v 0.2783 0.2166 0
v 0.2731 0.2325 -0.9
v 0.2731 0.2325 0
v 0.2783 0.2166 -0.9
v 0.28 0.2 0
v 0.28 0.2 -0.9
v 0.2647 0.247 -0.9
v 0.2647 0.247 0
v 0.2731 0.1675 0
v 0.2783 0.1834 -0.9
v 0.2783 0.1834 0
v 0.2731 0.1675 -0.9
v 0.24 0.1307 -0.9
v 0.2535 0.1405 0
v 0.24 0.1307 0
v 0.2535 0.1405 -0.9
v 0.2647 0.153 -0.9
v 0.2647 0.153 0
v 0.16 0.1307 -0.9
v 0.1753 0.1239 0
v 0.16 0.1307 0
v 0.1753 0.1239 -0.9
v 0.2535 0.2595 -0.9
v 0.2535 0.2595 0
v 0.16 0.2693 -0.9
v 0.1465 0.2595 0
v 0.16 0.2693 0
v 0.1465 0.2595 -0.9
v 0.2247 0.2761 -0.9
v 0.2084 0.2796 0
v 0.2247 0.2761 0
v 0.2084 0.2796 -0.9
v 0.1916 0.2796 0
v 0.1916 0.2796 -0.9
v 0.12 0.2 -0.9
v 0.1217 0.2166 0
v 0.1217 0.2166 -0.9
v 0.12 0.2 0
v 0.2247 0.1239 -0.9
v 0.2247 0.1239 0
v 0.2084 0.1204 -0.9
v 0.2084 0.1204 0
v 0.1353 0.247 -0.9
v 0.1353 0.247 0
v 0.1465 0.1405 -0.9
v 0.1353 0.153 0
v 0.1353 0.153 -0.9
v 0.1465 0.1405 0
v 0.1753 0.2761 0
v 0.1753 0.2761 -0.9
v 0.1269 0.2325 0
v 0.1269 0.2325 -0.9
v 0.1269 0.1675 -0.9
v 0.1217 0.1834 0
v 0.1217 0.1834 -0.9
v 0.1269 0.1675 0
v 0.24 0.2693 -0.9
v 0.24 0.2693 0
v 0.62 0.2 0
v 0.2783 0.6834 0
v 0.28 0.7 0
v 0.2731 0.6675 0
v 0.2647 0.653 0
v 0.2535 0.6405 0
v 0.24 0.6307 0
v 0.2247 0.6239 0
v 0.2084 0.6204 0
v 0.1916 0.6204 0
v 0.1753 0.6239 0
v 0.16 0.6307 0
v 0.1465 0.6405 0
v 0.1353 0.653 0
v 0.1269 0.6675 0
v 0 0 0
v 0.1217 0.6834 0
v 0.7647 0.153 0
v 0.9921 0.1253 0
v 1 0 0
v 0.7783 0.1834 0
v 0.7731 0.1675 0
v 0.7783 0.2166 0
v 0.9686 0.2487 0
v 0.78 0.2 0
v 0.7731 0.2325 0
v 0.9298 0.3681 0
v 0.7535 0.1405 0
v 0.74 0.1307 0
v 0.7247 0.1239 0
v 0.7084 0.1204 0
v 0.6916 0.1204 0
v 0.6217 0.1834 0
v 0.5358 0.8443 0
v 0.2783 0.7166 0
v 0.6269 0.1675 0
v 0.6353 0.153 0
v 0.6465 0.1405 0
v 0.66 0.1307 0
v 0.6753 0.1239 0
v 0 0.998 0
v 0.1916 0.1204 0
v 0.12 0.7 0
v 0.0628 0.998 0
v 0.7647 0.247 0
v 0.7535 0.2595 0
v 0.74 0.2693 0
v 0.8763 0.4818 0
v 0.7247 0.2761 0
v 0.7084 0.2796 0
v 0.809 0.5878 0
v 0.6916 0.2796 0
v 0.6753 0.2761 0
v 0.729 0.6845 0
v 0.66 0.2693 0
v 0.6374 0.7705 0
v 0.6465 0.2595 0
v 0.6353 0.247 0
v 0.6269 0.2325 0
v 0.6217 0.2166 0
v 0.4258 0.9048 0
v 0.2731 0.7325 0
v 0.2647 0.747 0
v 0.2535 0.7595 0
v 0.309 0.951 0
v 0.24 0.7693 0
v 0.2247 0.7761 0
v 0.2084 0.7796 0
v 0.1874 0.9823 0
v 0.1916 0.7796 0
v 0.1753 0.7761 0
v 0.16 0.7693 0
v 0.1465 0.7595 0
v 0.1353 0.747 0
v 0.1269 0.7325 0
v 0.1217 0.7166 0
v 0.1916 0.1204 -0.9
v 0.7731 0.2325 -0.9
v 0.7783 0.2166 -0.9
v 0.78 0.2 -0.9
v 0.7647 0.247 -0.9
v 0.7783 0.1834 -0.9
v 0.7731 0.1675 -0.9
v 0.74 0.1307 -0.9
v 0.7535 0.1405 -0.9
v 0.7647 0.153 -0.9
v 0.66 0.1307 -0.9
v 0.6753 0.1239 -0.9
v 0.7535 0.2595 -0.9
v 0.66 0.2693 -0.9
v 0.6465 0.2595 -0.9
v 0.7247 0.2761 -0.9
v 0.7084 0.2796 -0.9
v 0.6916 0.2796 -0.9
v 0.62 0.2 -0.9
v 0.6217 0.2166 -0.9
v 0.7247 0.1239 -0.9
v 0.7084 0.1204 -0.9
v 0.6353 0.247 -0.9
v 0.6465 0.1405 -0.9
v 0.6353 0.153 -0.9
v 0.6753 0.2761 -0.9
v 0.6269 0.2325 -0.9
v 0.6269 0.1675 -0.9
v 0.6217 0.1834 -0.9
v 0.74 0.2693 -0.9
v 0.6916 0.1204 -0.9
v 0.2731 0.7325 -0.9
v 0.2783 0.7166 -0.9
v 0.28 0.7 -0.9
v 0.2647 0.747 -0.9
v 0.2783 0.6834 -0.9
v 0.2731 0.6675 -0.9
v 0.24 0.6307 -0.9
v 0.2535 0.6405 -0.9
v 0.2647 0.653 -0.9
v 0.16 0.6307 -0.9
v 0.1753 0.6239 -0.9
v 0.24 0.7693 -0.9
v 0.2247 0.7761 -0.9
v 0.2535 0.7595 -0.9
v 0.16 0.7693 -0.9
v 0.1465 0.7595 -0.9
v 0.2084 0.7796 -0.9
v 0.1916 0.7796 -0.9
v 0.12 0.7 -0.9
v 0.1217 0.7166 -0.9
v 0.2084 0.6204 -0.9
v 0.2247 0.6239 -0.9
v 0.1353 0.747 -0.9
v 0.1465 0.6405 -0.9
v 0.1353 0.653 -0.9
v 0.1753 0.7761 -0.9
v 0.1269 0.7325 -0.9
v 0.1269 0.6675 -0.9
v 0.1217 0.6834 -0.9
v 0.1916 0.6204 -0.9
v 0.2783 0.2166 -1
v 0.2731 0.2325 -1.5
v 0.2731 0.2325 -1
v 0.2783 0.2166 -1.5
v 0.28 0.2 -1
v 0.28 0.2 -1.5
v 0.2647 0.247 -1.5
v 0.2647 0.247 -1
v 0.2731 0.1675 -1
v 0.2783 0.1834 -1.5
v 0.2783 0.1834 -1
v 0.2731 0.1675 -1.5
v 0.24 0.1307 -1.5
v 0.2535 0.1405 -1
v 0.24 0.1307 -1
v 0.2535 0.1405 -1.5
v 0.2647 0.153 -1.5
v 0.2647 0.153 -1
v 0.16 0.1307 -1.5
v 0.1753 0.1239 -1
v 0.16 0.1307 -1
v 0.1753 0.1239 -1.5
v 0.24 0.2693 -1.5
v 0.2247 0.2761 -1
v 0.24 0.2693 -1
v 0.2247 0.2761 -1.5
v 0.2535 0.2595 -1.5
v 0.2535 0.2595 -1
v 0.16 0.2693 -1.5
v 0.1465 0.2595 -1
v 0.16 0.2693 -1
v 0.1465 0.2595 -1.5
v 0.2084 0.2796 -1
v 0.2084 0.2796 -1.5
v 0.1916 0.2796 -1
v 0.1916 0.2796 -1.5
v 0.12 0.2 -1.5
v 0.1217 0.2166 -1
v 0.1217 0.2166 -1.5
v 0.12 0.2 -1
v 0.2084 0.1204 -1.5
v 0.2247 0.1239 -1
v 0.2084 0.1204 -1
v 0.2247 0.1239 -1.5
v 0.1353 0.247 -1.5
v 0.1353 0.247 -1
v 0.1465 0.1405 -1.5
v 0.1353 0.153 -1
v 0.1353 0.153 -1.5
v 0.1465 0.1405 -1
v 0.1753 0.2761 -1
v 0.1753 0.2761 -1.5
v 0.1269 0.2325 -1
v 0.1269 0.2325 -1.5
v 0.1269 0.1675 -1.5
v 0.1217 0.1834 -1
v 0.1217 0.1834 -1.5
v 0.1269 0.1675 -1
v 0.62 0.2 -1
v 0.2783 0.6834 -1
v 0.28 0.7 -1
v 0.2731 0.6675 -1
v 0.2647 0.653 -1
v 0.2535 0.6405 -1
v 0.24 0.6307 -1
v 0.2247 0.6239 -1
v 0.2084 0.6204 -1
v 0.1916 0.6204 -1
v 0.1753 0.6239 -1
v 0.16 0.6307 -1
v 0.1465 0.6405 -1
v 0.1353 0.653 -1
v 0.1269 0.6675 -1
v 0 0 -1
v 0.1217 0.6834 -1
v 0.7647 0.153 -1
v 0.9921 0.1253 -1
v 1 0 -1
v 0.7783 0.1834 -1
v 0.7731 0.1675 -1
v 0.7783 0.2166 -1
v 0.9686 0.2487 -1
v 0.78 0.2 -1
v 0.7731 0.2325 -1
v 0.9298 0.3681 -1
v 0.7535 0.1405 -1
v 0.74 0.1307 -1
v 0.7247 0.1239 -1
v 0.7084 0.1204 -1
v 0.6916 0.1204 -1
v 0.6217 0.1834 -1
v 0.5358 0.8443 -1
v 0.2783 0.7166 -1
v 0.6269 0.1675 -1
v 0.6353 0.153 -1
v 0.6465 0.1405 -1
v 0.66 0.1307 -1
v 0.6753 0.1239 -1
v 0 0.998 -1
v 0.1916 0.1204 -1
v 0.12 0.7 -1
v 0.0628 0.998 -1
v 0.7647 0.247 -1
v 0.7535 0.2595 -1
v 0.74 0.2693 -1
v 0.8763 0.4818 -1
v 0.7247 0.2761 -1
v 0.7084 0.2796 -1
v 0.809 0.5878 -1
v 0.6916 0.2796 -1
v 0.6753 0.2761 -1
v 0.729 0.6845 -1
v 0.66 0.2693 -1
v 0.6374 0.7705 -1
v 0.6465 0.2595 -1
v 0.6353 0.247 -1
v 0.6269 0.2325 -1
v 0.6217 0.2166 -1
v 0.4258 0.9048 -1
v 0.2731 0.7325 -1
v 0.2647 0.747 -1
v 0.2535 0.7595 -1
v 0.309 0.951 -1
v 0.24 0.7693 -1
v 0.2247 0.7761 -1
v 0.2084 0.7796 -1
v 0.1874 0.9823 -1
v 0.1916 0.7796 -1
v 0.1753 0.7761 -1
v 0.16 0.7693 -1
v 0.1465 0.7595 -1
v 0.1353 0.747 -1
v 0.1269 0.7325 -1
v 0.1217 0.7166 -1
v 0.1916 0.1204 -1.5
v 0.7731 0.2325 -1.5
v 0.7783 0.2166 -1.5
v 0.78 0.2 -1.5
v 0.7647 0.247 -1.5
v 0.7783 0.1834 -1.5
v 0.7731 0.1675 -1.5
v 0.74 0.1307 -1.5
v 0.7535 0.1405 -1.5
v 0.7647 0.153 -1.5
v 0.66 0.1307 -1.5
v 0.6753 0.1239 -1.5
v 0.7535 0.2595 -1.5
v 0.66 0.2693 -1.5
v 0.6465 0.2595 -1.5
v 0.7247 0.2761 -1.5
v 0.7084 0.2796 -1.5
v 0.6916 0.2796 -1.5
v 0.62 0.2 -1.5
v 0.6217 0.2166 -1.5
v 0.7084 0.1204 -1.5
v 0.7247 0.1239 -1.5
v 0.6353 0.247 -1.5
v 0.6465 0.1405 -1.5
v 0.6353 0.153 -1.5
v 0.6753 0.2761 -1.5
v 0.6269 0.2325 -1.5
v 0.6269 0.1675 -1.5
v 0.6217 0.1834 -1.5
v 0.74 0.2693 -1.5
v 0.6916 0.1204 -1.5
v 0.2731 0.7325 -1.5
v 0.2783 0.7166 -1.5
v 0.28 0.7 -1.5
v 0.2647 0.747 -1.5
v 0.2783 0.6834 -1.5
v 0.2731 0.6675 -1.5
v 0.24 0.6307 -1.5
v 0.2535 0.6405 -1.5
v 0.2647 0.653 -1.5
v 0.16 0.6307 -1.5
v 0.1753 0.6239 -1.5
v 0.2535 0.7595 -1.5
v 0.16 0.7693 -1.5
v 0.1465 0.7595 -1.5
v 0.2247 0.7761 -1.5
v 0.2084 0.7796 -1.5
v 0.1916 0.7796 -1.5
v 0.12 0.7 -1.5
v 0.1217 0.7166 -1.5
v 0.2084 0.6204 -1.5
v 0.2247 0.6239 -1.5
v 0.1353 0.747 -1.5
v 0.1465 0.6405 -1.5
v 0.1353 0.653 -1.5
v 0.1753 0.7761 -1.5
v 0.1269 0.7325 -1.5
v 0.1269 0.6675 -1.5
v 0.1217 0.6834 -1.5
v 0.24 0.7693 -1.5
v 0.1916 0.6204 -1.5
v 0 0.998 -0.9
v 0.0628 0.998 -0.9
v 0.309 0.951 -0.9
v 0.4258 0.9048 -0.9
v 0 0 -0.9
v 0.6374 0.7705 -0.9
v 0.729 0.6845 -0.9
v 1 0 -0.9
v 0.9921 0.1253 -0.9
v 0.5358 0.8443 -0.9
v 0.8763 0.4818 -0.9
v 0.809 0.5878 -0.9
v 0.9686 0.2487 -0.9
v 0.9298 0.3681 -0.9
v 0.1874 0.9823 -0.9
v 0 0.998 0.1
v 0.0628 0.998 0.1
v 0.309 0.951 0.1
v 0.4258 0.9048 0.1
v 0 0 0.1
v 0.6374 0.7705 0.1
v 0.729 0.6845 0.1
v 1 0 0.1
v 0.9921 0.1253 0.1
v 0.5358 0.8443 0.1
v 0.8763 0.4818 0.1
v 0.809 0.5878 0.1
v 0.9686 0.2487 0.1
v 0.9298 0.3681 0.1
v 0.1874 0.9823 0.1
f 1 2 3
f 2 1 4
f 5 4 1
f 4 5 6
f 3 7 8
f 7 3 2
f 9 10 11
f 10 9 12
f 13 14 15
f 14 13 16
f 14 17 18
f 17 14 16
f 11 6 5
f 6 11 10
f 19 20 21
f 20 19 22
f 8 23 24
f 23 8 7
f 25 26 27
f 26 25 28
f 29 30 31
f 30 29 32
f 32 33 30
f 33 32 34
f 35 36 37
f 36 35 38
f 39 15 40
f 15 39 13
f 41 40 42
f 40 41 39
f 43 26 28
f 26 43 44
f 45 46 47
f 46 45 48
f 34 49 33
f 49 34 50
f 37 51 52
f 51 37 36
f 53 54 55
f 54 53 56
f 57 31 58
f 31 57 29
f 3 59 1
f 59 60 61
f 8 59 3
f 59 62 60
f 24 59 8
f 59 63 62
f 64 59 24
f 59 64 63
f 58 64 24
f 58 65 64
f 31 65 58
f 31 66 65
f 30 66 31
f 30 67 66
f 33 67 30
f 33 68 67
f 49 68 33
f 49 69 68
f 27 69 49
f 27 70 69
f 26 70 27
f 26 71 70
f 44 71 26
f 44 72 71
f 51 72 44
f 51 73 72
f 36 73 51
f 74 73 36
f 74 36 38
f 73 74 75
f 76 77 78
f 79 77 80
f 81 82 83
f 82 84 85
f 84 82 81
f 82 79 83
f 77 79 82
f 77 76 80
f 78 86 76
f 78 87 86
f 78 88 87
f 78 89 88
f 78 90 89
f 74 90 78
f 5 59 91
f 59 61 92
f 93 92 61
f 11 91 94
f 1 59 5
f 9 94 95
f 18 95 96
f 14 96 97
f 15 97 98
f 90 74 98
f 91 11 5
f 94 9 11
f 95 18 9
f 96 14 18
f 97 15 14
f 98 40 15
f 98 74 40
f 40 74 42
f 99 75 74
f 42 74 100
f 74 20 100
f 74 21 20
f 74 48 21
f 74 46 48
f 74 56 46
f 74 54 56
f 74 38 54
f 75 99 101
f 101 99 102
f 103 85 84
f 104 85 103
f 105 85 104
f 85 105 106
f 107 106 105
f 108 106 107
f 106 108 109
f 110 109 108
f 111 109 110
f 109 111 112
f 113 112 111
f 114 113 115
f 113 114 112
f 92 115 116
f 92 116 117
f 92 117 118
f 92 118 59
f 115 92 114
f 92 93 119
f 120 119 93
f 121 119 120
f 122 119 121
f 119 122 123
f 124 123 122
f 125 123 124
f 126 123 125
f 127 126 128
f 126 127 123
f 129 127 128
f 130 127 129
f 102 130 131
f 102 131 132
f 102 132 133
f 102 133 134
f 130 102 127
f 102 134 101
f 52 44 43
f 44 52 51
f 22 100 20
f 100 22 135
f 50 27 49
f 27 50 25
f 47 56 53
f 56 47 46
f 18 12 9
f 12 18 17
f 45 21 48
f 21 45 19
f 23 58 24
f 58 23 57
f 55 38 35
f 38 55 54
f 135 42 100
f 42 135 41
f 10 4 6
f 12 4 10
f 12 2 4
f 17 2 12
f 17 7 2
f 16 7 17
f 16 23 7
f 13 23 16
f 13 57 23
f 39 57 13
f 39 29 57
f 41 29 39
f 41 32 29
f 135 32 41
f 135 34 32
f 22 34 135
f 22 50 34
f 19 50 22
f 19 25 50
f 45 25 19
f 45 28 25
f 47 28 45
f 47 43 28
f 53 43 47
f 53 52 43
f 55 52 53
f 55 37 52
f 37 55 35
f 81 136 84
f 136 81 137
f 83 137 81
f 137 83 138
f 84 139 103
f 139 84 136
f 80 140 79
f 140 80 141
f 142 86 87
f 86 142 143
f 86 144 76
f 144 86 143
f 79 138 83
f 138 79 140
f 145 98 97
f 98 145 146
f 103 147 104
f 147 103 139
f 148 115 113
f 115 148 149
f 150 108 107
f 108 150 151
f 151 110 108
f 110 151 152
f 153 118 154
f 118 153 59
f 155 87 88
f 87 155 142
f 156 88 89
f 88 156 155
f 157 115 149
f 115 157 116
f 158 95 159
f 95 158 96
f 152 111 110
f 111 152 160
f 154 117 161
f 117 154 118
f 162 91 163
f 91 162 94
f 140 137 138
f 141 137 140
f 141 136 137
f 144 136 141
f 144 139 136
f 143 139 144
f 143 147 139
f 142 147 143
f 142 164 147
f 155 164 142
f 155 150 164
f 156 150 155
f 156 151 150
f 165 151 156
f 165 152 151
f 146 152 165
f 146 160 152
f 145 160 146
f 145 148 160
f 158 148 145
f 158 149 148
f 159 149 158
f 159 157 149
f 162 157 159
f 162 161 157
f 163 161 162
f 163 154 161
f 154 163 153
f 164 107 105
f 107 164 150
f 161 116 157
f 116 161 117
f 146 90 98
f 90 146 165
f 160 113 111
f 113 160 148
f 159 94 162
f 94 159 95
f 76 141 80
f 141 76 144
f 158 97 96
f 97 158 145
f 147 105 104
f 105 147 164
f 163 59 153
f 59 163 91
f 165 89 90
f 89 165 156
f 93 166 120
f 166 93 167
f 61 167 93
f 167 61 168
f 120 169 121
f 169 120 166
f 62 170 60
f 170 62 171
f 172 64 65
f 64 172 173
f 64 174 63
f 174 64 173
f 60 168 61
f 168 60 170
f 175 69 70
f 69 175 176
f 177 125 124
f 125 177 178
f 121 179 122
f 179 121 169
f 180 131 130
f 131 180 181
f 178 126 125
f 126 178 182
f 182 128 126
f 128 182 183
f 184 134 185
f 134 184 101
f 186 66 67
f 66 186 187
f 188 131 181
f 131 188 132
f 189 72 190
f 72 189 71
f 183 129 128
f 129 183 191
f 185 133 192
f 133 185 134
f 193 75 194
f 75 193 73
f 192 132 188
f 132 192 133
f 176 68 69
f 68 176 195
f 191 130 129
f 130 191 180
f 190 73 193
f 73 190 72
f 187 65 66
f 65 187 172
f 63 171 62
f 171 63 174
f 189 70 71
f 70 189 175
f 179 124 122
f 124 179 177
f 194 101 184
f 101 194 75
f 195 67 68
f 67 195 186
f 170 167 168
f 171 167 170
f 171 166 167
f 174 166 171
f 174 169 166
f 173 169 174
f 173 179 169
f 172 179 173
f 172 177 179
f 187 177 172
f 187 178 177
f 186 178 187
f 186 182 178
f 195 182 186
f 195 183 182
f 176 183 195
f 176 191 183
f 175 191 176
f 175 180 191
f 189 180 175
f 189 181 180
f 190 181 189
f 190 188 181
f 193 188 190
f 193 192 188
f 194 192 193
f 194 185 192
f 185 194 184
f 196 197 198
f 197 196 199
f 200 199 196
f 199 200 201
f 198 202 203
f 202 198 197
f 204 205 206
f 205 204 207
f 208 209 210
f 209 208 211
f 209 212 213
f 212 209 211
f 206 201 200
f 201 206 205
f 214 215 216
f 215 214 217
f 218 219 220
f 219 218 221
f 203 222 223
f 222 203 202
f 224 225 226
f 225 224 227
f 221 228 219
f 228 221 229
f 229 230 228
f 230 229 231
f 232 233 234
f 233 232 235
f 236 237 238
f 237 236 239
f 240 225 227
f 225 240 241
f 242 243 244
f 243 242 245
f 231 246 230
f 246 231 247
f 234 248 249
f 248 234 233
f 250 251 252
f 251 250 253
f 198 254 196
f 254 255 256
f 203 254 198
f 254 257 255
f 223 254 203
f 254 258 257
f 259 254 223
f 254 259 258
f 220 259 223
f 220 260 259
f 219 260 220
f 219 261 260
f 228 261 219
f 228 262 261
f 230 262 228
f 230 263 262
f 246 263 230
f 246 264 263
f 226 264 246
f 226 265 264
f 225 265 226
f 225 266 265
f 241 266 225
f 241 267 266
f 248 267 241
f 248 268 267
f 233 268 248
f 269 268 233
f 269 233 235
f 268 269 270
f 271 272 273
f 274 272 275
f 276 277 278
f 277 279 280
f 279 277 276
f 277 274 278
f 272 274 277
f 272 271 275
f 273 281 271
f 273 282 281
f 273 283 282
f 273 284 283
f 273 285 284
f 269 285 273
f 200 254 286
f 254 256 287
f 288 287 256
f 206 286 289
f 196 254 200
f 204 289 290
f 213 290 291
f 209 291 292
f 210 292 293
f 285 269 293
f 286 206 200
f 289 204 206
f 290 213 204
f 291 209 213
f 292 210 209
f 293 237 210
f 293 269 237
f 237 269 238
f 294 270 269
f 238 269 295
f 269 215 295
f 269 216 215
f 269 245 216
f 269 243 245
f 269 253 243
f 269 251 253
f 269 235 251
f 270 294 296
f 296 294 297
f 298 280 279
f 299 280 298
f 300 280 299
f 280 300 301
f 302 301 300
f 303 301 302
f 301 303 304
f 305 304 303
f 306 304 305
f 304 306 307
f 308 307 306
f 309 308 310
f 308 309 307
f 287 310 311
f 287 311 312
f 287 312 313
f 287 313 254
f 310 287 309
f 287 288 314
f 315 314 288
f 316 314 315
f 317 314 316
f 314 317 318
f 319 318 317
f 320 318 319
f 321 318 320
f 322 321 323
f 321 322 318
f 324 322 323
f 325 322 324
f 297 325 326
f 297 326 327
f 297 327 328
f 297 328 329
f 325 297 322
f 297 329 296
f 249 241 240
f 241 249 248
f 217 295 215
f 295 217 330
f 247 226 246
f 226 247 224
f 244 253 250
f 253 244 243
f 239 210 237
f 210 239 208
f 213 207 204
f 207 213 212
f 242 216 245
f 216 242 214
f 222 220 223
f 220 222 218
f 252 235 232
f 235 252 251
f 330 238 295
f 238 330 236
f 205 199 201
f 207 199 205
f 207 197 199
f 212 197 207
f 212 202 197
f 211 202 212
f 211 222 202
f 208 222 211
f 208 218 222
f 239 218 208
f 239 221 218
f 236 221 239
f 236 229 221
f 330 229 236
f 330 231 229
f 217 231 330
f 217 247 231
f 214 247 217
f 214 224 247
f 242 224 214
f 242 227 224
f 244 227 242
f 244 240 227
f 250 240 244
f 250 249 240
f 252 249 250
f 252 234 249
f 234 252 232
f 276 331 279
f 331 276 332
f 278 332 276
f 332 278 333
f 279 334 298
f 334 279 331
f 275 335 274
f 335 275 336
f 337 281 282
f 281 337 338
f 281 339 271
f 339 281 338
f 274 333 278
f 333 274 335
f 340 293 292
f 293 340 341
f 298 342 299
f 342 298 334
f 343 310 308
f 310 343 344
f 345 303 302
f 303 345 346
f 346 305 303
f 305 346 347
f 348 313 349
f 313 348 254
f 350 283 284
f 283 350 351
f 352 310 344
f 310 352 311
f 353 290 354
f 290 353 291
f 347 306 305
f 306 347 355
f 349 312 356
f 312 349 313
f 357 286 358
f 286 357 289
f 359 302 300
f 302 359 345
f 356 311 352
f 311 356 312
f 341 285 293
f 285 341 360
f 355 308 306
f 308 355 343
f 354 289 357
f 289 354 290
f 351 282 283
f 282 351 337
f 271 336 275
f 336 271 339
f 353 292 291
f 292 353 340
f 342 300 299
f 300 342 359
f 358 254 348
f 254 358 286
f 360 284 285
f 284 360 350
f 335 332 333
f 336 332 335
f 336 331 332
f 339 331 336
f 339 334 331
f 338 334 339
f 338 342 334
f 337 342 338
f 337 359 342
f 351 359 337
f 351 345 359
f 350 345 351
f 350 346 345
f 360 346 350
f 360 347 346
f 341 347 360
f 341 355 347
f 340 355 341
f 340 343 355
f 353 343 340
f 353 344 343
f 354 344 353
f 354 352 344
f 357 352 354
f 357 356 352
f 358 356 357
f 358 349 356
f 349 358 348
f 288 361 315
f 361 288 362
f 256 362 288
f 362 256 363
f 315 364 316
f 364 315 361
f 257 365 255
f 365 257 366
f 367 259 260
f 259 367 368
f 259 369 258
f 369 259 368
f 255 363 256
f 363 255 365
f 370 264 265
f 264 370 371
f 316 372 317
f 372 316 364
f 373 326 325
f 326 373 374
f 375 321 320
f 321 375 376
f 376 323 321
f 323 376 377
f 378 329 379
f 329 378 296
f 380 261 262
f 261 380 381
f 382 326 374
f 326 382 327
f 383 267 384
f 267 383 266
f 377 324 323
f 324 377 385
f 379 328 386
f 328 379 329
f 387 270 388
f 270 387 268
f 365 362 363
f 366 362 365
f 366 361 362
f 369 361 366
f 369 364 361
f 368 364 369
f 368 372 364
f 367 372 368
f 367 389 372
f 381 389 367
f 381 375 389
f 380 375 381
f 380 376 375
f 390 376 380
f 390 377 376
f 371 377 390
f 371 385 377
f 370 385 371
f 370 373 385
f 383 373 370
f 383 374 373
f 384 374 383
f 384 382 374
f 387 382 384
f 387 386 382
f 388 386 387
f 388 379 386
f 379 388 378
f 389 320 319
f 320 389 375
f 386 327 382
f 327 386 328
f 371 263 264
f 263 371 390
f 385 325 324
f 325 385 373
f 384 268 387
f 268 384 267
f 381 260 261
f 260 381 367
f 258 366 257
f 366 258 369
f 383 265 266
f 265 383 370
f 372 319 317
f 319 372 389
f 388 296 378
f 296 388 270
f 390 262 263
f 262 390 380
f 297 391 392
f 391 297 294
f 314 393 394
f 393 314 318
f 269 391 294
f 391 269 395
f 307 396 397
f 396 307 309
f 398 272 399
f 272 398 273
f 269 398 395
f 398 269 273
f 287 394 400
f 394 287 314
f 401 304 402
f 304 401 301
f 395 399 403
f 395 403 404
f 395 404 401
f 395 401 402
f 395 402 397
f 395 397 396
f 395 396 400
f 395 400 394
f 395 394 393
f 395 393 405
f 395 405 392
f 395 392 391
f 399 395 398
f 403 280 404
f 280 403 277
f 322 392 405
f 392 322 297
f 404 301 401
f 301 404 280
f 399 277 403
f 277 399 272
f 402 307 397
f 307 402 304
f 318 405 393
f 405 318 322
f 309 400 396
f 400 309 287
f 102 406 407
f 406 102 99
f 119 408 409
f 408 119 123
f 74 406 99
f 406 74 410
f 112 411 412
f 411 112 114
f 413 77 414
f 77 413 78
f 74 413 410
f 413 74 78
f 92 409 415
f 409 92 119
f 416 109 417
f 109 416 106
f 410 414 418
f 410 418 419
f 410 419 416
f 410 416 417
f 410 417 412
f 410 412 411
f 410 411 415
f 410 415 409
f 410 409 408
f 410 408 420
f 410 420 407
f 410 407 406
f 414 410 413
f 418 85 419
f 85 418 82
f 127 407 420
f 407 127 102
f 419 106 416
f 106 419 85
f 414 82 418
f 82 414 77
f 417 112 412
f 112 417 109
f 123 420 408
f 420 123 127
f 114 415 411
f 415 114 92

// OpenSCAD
module Table_Small_01(){

    color("#954520")
    linear_extrude(height = 0.10)

    intersection(){

    circle(1, $fn=50);

    square(1);

    }

    color("#4f200f"){
    translate([0.2,0.2,-0.9])
    cylinder(0.9,0.08,0.08, $fn =30);

    translate([0.7,0.2,-0.9])
    cylinder(0.9,0.08,0.08, $fn =30);

    translate([0.2,0.7,-0.9])
    cylinder(0.9,0.08,0.08, $fn =30);
    }

    translate([0,0,-1]){
    color("#954520")
    linear_extrude(height = 0.10)

    intersection(){

    circle(1, $fn=50);

    square(1);

    }

    color("#4f200f"){
    translate([0.2,0.2,-0.5])
    cylinder(0.5,0.08,0.08, $fn =30);

    translate([0.7,0.2,-0.5])
    cylinder(0.5,0.08,0.08, $fn =30);

    translate([0.2,0.7,-0.5])
    cylinder(0.5,0.08,0.08, $fn =30);
    }
    }

}

Table_Small_01();

// Written by Nicolì Angelo (Gengio) 2024: 
// MIT License

//Permission is hereby granted, free of charge, to any person obtaining a copy of this software and associated documentation files (the "Software"), to deal in the Software without restriction, including without limitation the rights to use, copy, modify, merge, publish, distribute, sublicense, and/or sell copies of the Software, and to permit persons to whom the Software is furnished to do so, subject to the following conditions:

//The above copyright notice and this permission notice shall be included in all copies or substantial portions of the Software.

//THE SOFTWARE IS PROVIDED "AS IS", WITHOUT WARRANTY OF ANY KIND, EXPRESS OR IMPLIED, INCLUDING BUT NOT LIMITED TO THE WARRANTIES OF MERCHANTABILITY, FITNESS FOR A PARTICULAR PURPOSE AND NONINFRINGEMENT. IN NO EVENT SHALL THE AUTHORS OR COPYRIGHT HOLDERS BE LIABLE FOR ANY CLAIM, DAMAGES OR OTHER LIABILITY, WHETHER IN AN ACTION OF CONTRACT, TORT OR OTHERWISE, ARISING FROM, OUT OF OR IN CONNECTION WITH THE SOFTWARE OR THE USE OR OTHER DEALINGS IN THE SOFTWARE.
